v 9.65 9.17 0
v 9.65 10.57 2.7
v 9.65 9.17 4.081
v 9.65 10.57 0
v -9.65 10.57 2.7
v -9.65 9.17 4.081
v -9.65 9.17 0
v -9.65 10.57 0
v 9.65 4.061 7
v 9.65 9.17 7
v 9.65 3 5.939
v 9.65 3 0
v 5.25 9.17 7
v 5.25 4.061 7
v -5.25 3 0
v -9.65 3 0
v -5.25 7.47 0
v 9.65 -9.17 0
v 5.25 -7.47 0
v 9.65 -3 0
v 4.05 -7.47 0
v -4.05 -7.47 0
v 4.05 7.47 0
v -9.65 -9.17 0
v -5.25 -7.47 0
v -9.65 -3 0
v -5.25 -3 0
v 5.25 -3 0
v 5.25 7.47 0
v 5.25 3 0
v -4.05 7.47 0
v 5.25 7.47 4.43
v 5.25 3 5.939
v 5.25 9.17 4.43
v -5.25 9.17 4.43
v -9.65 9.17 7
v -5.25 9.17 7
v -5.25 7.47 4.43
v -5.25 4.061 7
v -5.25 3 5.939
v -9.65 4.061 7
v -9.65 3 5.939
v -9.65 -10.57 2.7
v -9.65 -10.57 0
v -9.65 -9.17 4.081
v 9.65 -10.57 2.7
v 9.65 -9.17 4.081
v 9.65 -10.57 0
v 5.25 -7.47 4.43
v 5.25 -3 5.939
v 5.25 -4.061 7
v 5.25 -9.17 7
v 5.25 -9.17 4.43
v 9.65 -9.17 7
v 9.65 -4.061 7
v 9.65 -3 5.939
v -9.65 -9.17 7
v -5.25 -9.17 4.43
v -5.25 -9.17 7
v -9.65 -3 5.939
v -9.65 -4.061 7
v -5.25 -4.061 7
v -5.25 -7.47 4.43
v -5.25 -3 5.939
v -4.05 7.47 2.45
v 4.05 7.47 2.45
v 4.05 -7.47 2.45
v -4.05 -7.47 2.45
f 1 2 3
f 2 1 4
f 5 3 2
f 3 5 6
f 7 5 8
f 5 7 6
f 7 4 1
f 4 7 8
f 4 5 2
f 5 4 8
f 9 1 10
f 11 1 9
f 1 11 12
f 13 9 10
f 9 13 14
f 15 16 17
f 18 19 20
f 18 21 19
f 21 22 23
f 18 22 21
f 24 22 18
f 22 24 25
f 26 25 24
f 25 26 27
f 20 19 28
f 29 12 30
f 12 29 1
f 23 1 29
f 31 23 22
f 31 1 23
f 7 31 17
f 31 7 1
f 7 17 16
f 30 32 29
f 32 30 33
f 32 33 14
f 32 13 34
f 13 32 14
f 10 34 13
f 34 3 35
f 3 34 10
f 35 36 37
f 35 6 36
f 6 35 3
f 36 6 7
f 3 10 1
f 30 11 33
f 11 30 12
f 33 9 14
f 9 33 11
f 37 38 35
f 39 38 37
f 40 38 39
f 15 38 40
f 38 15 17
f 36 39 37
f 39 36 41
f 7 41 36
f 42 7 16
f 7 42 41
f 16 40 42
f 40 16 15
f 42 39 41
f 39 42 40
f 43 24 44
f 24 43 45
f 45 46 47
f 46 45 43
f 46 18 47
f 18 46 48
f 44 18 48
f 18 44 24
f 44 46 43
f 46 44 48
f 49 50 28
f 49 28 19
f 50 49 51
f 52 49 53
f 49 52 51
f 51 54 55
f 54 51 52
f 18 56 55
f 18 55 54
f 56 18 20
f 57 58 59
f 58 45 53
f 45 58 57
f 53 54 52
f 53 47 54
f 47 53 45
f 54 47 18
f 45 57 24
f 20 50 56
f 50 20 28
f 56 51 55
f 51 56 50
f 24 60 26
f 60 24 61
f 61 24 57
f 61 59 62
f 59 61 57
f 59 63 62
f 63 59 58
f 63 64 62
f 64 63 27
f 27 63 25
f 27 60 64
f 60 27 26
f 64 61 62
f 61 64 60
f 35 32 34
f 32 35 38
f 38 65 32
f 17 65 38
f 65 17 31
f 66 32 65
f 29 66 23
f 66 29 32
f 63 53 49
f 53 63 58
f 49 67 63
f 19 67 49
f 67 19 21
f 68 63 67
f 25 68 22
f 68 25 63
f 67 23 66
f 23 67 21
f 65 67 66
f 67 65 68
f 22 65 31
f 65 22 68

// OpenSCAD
crenel_wdh = [4.4, 6.17, 7];

gap_x = 10.5; // distance between crenels
sliver_x = 1.2; // gap between crenel and bridge
gap_y = 6; // most critical; distance between crenels

platform_overhang = 1.5;
bridge_wdh = [
  gap_x - (2*sliver_x),
  (2*crenel_wdh.y)+gap_y,
  2.45
];

// There are no curves lol
//$fn = $preview ? 32 : 90;


base();

module base() {
  // bridge
  translate([0, 0, bridge_wdh.z/2])
    cube(bridge_wdh, center=true);

  ridge_wdh = [gap_x + (2*crenel_wdh.x), 1.7, bridge_wdh.z + 1.98];
  for (y = [1, -1]) {
    // ridges mesh into bridge
    ridge_trans_y = y*(bridge_wdh.y/2 - ridge_wdh.y/2);
    #translate([0, ridge_trans_y, ridge_wdh.z/2])
      cube(ridge_wdh, center=true);

    // shelf in the back
    shelf_wdh = [ridge_wdh.x, platform_overhang, 2.7];
    tri_chamf_h = ridge_wdh.z - shelf_wdh.z - 0.25;
    translate([0, ridge_trans_y+(y*shelf_wdh.y), shelf_wdh.z/2])
      rotate([0, 0, y > 0 ? 0 : 180])
      union() {
        translate([(shelf_wdh.x/2), shelf_wdh.y/-2, shelf_wdh.z/2])
        rotate([0, -90, 0])
          linear_extrude(height = shelf_wdh.x)
          polygon([
            [0,0], [0,shelf_wdh.y], [tri_chamf_h, 0]
          ]);

        cube(shelf_wdh, center=true);
      }

    // crenels
    for (x = [1, -1]) {
      translate([
        x*(ridge_wdh.x/2 - crenel_wdh.x/2),
        (ridge_trans_y+ridge_wdh.y/(y*2))+(crenel_wdh.y*-y),
        0
      ])
        crenel(y);
    }

  }

}

// side can be 1 or -1
module crenel(side=1) {
  rotate([0, 0, side < 1 ? 180 : 0])
  difference() {
    translate([crenel_wdh.x/-2, 0, 0])
      cube(crenel_wdh);

    // chamfer
    chamf = [crenel_wdh.x + 2, 1.5, 1.5];
    translate([0, 0, crenel_wdh.z])
      rotate([45, 0, 0])
      cube(chamf, center=true);
  }

}
